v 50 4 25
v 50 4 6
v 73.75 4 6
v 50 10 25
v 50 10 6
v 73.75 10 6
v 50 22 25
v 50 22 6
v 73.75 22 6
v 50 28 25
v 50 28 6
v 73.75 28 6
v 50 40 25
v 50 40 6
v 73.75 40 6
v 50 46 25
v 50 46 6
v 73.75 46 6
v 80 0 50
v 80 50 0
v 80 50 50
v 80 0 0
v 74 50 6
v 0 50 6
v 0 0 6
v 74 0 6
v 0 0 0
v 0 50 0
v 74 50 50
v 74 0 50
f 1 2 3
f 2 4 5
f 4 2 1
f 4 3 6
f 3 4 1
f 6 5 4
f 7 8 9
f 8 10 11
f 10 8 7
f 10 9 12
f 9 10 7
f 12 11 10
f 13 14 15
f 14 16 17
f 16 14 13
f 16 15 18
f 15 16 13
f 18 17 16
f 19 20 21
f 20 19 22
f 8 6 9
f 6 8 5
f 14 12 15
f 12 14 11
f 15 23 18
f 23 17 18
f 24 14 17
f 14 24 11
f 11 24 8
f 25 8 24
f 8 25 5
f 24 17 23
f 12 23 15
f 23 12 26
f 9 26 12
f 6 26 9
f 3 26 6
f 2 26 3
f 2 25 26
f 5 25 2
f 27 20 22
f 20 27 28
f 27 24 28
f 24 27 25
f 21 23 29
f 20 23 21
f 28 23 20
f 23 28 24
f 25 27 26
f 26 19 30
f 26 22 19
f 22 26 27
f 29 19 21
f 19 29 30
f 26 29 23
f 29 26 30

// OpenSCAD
$fn = 32;

// ----------------------------------------------------------------------
// Rib bracket: 3-gusset L bracket
// ----------------------------------------------------------------------

// --- parameters (mm) ---
base_l = 80;              // foot length, X
base_w = 50;              // foot width, Y
base_t = 6;               // foot thickness
plate_t = 6;              // upright plate thickness
plate_h = 50;             // overall height
gus_l = 24;               // gusset leg along the foot
gus_h = 20;               // gusset height
gus_t = 6;                // gusset thickness
gus_edge = 4;             // gusset margin from the foot edge
n_gus = 3;                // gusset count

gus_pitch = (base_w - 2 * gus_edge - gus_t) / (n_gus - 1);  // gusset pitch

union() {
  cube([base_l, base_w, base_t]);
  translate([base_l - plate_t, 0, base_t - 1])
    cube([plate_t, base_w, plate_h - base_t + 1]);
  for (i = [0 : n_gus - 1])
    translate([base_l - plate_t - gus_l, gus_edge + i * gus_pitch, base_t - 1])
      rotate([-90, 0, 0])
        linear_extrude(height = gus_t)
          polygon(points = [[0, 0], [gus_l + 1, 0], [0, -gus_h]]);
}
